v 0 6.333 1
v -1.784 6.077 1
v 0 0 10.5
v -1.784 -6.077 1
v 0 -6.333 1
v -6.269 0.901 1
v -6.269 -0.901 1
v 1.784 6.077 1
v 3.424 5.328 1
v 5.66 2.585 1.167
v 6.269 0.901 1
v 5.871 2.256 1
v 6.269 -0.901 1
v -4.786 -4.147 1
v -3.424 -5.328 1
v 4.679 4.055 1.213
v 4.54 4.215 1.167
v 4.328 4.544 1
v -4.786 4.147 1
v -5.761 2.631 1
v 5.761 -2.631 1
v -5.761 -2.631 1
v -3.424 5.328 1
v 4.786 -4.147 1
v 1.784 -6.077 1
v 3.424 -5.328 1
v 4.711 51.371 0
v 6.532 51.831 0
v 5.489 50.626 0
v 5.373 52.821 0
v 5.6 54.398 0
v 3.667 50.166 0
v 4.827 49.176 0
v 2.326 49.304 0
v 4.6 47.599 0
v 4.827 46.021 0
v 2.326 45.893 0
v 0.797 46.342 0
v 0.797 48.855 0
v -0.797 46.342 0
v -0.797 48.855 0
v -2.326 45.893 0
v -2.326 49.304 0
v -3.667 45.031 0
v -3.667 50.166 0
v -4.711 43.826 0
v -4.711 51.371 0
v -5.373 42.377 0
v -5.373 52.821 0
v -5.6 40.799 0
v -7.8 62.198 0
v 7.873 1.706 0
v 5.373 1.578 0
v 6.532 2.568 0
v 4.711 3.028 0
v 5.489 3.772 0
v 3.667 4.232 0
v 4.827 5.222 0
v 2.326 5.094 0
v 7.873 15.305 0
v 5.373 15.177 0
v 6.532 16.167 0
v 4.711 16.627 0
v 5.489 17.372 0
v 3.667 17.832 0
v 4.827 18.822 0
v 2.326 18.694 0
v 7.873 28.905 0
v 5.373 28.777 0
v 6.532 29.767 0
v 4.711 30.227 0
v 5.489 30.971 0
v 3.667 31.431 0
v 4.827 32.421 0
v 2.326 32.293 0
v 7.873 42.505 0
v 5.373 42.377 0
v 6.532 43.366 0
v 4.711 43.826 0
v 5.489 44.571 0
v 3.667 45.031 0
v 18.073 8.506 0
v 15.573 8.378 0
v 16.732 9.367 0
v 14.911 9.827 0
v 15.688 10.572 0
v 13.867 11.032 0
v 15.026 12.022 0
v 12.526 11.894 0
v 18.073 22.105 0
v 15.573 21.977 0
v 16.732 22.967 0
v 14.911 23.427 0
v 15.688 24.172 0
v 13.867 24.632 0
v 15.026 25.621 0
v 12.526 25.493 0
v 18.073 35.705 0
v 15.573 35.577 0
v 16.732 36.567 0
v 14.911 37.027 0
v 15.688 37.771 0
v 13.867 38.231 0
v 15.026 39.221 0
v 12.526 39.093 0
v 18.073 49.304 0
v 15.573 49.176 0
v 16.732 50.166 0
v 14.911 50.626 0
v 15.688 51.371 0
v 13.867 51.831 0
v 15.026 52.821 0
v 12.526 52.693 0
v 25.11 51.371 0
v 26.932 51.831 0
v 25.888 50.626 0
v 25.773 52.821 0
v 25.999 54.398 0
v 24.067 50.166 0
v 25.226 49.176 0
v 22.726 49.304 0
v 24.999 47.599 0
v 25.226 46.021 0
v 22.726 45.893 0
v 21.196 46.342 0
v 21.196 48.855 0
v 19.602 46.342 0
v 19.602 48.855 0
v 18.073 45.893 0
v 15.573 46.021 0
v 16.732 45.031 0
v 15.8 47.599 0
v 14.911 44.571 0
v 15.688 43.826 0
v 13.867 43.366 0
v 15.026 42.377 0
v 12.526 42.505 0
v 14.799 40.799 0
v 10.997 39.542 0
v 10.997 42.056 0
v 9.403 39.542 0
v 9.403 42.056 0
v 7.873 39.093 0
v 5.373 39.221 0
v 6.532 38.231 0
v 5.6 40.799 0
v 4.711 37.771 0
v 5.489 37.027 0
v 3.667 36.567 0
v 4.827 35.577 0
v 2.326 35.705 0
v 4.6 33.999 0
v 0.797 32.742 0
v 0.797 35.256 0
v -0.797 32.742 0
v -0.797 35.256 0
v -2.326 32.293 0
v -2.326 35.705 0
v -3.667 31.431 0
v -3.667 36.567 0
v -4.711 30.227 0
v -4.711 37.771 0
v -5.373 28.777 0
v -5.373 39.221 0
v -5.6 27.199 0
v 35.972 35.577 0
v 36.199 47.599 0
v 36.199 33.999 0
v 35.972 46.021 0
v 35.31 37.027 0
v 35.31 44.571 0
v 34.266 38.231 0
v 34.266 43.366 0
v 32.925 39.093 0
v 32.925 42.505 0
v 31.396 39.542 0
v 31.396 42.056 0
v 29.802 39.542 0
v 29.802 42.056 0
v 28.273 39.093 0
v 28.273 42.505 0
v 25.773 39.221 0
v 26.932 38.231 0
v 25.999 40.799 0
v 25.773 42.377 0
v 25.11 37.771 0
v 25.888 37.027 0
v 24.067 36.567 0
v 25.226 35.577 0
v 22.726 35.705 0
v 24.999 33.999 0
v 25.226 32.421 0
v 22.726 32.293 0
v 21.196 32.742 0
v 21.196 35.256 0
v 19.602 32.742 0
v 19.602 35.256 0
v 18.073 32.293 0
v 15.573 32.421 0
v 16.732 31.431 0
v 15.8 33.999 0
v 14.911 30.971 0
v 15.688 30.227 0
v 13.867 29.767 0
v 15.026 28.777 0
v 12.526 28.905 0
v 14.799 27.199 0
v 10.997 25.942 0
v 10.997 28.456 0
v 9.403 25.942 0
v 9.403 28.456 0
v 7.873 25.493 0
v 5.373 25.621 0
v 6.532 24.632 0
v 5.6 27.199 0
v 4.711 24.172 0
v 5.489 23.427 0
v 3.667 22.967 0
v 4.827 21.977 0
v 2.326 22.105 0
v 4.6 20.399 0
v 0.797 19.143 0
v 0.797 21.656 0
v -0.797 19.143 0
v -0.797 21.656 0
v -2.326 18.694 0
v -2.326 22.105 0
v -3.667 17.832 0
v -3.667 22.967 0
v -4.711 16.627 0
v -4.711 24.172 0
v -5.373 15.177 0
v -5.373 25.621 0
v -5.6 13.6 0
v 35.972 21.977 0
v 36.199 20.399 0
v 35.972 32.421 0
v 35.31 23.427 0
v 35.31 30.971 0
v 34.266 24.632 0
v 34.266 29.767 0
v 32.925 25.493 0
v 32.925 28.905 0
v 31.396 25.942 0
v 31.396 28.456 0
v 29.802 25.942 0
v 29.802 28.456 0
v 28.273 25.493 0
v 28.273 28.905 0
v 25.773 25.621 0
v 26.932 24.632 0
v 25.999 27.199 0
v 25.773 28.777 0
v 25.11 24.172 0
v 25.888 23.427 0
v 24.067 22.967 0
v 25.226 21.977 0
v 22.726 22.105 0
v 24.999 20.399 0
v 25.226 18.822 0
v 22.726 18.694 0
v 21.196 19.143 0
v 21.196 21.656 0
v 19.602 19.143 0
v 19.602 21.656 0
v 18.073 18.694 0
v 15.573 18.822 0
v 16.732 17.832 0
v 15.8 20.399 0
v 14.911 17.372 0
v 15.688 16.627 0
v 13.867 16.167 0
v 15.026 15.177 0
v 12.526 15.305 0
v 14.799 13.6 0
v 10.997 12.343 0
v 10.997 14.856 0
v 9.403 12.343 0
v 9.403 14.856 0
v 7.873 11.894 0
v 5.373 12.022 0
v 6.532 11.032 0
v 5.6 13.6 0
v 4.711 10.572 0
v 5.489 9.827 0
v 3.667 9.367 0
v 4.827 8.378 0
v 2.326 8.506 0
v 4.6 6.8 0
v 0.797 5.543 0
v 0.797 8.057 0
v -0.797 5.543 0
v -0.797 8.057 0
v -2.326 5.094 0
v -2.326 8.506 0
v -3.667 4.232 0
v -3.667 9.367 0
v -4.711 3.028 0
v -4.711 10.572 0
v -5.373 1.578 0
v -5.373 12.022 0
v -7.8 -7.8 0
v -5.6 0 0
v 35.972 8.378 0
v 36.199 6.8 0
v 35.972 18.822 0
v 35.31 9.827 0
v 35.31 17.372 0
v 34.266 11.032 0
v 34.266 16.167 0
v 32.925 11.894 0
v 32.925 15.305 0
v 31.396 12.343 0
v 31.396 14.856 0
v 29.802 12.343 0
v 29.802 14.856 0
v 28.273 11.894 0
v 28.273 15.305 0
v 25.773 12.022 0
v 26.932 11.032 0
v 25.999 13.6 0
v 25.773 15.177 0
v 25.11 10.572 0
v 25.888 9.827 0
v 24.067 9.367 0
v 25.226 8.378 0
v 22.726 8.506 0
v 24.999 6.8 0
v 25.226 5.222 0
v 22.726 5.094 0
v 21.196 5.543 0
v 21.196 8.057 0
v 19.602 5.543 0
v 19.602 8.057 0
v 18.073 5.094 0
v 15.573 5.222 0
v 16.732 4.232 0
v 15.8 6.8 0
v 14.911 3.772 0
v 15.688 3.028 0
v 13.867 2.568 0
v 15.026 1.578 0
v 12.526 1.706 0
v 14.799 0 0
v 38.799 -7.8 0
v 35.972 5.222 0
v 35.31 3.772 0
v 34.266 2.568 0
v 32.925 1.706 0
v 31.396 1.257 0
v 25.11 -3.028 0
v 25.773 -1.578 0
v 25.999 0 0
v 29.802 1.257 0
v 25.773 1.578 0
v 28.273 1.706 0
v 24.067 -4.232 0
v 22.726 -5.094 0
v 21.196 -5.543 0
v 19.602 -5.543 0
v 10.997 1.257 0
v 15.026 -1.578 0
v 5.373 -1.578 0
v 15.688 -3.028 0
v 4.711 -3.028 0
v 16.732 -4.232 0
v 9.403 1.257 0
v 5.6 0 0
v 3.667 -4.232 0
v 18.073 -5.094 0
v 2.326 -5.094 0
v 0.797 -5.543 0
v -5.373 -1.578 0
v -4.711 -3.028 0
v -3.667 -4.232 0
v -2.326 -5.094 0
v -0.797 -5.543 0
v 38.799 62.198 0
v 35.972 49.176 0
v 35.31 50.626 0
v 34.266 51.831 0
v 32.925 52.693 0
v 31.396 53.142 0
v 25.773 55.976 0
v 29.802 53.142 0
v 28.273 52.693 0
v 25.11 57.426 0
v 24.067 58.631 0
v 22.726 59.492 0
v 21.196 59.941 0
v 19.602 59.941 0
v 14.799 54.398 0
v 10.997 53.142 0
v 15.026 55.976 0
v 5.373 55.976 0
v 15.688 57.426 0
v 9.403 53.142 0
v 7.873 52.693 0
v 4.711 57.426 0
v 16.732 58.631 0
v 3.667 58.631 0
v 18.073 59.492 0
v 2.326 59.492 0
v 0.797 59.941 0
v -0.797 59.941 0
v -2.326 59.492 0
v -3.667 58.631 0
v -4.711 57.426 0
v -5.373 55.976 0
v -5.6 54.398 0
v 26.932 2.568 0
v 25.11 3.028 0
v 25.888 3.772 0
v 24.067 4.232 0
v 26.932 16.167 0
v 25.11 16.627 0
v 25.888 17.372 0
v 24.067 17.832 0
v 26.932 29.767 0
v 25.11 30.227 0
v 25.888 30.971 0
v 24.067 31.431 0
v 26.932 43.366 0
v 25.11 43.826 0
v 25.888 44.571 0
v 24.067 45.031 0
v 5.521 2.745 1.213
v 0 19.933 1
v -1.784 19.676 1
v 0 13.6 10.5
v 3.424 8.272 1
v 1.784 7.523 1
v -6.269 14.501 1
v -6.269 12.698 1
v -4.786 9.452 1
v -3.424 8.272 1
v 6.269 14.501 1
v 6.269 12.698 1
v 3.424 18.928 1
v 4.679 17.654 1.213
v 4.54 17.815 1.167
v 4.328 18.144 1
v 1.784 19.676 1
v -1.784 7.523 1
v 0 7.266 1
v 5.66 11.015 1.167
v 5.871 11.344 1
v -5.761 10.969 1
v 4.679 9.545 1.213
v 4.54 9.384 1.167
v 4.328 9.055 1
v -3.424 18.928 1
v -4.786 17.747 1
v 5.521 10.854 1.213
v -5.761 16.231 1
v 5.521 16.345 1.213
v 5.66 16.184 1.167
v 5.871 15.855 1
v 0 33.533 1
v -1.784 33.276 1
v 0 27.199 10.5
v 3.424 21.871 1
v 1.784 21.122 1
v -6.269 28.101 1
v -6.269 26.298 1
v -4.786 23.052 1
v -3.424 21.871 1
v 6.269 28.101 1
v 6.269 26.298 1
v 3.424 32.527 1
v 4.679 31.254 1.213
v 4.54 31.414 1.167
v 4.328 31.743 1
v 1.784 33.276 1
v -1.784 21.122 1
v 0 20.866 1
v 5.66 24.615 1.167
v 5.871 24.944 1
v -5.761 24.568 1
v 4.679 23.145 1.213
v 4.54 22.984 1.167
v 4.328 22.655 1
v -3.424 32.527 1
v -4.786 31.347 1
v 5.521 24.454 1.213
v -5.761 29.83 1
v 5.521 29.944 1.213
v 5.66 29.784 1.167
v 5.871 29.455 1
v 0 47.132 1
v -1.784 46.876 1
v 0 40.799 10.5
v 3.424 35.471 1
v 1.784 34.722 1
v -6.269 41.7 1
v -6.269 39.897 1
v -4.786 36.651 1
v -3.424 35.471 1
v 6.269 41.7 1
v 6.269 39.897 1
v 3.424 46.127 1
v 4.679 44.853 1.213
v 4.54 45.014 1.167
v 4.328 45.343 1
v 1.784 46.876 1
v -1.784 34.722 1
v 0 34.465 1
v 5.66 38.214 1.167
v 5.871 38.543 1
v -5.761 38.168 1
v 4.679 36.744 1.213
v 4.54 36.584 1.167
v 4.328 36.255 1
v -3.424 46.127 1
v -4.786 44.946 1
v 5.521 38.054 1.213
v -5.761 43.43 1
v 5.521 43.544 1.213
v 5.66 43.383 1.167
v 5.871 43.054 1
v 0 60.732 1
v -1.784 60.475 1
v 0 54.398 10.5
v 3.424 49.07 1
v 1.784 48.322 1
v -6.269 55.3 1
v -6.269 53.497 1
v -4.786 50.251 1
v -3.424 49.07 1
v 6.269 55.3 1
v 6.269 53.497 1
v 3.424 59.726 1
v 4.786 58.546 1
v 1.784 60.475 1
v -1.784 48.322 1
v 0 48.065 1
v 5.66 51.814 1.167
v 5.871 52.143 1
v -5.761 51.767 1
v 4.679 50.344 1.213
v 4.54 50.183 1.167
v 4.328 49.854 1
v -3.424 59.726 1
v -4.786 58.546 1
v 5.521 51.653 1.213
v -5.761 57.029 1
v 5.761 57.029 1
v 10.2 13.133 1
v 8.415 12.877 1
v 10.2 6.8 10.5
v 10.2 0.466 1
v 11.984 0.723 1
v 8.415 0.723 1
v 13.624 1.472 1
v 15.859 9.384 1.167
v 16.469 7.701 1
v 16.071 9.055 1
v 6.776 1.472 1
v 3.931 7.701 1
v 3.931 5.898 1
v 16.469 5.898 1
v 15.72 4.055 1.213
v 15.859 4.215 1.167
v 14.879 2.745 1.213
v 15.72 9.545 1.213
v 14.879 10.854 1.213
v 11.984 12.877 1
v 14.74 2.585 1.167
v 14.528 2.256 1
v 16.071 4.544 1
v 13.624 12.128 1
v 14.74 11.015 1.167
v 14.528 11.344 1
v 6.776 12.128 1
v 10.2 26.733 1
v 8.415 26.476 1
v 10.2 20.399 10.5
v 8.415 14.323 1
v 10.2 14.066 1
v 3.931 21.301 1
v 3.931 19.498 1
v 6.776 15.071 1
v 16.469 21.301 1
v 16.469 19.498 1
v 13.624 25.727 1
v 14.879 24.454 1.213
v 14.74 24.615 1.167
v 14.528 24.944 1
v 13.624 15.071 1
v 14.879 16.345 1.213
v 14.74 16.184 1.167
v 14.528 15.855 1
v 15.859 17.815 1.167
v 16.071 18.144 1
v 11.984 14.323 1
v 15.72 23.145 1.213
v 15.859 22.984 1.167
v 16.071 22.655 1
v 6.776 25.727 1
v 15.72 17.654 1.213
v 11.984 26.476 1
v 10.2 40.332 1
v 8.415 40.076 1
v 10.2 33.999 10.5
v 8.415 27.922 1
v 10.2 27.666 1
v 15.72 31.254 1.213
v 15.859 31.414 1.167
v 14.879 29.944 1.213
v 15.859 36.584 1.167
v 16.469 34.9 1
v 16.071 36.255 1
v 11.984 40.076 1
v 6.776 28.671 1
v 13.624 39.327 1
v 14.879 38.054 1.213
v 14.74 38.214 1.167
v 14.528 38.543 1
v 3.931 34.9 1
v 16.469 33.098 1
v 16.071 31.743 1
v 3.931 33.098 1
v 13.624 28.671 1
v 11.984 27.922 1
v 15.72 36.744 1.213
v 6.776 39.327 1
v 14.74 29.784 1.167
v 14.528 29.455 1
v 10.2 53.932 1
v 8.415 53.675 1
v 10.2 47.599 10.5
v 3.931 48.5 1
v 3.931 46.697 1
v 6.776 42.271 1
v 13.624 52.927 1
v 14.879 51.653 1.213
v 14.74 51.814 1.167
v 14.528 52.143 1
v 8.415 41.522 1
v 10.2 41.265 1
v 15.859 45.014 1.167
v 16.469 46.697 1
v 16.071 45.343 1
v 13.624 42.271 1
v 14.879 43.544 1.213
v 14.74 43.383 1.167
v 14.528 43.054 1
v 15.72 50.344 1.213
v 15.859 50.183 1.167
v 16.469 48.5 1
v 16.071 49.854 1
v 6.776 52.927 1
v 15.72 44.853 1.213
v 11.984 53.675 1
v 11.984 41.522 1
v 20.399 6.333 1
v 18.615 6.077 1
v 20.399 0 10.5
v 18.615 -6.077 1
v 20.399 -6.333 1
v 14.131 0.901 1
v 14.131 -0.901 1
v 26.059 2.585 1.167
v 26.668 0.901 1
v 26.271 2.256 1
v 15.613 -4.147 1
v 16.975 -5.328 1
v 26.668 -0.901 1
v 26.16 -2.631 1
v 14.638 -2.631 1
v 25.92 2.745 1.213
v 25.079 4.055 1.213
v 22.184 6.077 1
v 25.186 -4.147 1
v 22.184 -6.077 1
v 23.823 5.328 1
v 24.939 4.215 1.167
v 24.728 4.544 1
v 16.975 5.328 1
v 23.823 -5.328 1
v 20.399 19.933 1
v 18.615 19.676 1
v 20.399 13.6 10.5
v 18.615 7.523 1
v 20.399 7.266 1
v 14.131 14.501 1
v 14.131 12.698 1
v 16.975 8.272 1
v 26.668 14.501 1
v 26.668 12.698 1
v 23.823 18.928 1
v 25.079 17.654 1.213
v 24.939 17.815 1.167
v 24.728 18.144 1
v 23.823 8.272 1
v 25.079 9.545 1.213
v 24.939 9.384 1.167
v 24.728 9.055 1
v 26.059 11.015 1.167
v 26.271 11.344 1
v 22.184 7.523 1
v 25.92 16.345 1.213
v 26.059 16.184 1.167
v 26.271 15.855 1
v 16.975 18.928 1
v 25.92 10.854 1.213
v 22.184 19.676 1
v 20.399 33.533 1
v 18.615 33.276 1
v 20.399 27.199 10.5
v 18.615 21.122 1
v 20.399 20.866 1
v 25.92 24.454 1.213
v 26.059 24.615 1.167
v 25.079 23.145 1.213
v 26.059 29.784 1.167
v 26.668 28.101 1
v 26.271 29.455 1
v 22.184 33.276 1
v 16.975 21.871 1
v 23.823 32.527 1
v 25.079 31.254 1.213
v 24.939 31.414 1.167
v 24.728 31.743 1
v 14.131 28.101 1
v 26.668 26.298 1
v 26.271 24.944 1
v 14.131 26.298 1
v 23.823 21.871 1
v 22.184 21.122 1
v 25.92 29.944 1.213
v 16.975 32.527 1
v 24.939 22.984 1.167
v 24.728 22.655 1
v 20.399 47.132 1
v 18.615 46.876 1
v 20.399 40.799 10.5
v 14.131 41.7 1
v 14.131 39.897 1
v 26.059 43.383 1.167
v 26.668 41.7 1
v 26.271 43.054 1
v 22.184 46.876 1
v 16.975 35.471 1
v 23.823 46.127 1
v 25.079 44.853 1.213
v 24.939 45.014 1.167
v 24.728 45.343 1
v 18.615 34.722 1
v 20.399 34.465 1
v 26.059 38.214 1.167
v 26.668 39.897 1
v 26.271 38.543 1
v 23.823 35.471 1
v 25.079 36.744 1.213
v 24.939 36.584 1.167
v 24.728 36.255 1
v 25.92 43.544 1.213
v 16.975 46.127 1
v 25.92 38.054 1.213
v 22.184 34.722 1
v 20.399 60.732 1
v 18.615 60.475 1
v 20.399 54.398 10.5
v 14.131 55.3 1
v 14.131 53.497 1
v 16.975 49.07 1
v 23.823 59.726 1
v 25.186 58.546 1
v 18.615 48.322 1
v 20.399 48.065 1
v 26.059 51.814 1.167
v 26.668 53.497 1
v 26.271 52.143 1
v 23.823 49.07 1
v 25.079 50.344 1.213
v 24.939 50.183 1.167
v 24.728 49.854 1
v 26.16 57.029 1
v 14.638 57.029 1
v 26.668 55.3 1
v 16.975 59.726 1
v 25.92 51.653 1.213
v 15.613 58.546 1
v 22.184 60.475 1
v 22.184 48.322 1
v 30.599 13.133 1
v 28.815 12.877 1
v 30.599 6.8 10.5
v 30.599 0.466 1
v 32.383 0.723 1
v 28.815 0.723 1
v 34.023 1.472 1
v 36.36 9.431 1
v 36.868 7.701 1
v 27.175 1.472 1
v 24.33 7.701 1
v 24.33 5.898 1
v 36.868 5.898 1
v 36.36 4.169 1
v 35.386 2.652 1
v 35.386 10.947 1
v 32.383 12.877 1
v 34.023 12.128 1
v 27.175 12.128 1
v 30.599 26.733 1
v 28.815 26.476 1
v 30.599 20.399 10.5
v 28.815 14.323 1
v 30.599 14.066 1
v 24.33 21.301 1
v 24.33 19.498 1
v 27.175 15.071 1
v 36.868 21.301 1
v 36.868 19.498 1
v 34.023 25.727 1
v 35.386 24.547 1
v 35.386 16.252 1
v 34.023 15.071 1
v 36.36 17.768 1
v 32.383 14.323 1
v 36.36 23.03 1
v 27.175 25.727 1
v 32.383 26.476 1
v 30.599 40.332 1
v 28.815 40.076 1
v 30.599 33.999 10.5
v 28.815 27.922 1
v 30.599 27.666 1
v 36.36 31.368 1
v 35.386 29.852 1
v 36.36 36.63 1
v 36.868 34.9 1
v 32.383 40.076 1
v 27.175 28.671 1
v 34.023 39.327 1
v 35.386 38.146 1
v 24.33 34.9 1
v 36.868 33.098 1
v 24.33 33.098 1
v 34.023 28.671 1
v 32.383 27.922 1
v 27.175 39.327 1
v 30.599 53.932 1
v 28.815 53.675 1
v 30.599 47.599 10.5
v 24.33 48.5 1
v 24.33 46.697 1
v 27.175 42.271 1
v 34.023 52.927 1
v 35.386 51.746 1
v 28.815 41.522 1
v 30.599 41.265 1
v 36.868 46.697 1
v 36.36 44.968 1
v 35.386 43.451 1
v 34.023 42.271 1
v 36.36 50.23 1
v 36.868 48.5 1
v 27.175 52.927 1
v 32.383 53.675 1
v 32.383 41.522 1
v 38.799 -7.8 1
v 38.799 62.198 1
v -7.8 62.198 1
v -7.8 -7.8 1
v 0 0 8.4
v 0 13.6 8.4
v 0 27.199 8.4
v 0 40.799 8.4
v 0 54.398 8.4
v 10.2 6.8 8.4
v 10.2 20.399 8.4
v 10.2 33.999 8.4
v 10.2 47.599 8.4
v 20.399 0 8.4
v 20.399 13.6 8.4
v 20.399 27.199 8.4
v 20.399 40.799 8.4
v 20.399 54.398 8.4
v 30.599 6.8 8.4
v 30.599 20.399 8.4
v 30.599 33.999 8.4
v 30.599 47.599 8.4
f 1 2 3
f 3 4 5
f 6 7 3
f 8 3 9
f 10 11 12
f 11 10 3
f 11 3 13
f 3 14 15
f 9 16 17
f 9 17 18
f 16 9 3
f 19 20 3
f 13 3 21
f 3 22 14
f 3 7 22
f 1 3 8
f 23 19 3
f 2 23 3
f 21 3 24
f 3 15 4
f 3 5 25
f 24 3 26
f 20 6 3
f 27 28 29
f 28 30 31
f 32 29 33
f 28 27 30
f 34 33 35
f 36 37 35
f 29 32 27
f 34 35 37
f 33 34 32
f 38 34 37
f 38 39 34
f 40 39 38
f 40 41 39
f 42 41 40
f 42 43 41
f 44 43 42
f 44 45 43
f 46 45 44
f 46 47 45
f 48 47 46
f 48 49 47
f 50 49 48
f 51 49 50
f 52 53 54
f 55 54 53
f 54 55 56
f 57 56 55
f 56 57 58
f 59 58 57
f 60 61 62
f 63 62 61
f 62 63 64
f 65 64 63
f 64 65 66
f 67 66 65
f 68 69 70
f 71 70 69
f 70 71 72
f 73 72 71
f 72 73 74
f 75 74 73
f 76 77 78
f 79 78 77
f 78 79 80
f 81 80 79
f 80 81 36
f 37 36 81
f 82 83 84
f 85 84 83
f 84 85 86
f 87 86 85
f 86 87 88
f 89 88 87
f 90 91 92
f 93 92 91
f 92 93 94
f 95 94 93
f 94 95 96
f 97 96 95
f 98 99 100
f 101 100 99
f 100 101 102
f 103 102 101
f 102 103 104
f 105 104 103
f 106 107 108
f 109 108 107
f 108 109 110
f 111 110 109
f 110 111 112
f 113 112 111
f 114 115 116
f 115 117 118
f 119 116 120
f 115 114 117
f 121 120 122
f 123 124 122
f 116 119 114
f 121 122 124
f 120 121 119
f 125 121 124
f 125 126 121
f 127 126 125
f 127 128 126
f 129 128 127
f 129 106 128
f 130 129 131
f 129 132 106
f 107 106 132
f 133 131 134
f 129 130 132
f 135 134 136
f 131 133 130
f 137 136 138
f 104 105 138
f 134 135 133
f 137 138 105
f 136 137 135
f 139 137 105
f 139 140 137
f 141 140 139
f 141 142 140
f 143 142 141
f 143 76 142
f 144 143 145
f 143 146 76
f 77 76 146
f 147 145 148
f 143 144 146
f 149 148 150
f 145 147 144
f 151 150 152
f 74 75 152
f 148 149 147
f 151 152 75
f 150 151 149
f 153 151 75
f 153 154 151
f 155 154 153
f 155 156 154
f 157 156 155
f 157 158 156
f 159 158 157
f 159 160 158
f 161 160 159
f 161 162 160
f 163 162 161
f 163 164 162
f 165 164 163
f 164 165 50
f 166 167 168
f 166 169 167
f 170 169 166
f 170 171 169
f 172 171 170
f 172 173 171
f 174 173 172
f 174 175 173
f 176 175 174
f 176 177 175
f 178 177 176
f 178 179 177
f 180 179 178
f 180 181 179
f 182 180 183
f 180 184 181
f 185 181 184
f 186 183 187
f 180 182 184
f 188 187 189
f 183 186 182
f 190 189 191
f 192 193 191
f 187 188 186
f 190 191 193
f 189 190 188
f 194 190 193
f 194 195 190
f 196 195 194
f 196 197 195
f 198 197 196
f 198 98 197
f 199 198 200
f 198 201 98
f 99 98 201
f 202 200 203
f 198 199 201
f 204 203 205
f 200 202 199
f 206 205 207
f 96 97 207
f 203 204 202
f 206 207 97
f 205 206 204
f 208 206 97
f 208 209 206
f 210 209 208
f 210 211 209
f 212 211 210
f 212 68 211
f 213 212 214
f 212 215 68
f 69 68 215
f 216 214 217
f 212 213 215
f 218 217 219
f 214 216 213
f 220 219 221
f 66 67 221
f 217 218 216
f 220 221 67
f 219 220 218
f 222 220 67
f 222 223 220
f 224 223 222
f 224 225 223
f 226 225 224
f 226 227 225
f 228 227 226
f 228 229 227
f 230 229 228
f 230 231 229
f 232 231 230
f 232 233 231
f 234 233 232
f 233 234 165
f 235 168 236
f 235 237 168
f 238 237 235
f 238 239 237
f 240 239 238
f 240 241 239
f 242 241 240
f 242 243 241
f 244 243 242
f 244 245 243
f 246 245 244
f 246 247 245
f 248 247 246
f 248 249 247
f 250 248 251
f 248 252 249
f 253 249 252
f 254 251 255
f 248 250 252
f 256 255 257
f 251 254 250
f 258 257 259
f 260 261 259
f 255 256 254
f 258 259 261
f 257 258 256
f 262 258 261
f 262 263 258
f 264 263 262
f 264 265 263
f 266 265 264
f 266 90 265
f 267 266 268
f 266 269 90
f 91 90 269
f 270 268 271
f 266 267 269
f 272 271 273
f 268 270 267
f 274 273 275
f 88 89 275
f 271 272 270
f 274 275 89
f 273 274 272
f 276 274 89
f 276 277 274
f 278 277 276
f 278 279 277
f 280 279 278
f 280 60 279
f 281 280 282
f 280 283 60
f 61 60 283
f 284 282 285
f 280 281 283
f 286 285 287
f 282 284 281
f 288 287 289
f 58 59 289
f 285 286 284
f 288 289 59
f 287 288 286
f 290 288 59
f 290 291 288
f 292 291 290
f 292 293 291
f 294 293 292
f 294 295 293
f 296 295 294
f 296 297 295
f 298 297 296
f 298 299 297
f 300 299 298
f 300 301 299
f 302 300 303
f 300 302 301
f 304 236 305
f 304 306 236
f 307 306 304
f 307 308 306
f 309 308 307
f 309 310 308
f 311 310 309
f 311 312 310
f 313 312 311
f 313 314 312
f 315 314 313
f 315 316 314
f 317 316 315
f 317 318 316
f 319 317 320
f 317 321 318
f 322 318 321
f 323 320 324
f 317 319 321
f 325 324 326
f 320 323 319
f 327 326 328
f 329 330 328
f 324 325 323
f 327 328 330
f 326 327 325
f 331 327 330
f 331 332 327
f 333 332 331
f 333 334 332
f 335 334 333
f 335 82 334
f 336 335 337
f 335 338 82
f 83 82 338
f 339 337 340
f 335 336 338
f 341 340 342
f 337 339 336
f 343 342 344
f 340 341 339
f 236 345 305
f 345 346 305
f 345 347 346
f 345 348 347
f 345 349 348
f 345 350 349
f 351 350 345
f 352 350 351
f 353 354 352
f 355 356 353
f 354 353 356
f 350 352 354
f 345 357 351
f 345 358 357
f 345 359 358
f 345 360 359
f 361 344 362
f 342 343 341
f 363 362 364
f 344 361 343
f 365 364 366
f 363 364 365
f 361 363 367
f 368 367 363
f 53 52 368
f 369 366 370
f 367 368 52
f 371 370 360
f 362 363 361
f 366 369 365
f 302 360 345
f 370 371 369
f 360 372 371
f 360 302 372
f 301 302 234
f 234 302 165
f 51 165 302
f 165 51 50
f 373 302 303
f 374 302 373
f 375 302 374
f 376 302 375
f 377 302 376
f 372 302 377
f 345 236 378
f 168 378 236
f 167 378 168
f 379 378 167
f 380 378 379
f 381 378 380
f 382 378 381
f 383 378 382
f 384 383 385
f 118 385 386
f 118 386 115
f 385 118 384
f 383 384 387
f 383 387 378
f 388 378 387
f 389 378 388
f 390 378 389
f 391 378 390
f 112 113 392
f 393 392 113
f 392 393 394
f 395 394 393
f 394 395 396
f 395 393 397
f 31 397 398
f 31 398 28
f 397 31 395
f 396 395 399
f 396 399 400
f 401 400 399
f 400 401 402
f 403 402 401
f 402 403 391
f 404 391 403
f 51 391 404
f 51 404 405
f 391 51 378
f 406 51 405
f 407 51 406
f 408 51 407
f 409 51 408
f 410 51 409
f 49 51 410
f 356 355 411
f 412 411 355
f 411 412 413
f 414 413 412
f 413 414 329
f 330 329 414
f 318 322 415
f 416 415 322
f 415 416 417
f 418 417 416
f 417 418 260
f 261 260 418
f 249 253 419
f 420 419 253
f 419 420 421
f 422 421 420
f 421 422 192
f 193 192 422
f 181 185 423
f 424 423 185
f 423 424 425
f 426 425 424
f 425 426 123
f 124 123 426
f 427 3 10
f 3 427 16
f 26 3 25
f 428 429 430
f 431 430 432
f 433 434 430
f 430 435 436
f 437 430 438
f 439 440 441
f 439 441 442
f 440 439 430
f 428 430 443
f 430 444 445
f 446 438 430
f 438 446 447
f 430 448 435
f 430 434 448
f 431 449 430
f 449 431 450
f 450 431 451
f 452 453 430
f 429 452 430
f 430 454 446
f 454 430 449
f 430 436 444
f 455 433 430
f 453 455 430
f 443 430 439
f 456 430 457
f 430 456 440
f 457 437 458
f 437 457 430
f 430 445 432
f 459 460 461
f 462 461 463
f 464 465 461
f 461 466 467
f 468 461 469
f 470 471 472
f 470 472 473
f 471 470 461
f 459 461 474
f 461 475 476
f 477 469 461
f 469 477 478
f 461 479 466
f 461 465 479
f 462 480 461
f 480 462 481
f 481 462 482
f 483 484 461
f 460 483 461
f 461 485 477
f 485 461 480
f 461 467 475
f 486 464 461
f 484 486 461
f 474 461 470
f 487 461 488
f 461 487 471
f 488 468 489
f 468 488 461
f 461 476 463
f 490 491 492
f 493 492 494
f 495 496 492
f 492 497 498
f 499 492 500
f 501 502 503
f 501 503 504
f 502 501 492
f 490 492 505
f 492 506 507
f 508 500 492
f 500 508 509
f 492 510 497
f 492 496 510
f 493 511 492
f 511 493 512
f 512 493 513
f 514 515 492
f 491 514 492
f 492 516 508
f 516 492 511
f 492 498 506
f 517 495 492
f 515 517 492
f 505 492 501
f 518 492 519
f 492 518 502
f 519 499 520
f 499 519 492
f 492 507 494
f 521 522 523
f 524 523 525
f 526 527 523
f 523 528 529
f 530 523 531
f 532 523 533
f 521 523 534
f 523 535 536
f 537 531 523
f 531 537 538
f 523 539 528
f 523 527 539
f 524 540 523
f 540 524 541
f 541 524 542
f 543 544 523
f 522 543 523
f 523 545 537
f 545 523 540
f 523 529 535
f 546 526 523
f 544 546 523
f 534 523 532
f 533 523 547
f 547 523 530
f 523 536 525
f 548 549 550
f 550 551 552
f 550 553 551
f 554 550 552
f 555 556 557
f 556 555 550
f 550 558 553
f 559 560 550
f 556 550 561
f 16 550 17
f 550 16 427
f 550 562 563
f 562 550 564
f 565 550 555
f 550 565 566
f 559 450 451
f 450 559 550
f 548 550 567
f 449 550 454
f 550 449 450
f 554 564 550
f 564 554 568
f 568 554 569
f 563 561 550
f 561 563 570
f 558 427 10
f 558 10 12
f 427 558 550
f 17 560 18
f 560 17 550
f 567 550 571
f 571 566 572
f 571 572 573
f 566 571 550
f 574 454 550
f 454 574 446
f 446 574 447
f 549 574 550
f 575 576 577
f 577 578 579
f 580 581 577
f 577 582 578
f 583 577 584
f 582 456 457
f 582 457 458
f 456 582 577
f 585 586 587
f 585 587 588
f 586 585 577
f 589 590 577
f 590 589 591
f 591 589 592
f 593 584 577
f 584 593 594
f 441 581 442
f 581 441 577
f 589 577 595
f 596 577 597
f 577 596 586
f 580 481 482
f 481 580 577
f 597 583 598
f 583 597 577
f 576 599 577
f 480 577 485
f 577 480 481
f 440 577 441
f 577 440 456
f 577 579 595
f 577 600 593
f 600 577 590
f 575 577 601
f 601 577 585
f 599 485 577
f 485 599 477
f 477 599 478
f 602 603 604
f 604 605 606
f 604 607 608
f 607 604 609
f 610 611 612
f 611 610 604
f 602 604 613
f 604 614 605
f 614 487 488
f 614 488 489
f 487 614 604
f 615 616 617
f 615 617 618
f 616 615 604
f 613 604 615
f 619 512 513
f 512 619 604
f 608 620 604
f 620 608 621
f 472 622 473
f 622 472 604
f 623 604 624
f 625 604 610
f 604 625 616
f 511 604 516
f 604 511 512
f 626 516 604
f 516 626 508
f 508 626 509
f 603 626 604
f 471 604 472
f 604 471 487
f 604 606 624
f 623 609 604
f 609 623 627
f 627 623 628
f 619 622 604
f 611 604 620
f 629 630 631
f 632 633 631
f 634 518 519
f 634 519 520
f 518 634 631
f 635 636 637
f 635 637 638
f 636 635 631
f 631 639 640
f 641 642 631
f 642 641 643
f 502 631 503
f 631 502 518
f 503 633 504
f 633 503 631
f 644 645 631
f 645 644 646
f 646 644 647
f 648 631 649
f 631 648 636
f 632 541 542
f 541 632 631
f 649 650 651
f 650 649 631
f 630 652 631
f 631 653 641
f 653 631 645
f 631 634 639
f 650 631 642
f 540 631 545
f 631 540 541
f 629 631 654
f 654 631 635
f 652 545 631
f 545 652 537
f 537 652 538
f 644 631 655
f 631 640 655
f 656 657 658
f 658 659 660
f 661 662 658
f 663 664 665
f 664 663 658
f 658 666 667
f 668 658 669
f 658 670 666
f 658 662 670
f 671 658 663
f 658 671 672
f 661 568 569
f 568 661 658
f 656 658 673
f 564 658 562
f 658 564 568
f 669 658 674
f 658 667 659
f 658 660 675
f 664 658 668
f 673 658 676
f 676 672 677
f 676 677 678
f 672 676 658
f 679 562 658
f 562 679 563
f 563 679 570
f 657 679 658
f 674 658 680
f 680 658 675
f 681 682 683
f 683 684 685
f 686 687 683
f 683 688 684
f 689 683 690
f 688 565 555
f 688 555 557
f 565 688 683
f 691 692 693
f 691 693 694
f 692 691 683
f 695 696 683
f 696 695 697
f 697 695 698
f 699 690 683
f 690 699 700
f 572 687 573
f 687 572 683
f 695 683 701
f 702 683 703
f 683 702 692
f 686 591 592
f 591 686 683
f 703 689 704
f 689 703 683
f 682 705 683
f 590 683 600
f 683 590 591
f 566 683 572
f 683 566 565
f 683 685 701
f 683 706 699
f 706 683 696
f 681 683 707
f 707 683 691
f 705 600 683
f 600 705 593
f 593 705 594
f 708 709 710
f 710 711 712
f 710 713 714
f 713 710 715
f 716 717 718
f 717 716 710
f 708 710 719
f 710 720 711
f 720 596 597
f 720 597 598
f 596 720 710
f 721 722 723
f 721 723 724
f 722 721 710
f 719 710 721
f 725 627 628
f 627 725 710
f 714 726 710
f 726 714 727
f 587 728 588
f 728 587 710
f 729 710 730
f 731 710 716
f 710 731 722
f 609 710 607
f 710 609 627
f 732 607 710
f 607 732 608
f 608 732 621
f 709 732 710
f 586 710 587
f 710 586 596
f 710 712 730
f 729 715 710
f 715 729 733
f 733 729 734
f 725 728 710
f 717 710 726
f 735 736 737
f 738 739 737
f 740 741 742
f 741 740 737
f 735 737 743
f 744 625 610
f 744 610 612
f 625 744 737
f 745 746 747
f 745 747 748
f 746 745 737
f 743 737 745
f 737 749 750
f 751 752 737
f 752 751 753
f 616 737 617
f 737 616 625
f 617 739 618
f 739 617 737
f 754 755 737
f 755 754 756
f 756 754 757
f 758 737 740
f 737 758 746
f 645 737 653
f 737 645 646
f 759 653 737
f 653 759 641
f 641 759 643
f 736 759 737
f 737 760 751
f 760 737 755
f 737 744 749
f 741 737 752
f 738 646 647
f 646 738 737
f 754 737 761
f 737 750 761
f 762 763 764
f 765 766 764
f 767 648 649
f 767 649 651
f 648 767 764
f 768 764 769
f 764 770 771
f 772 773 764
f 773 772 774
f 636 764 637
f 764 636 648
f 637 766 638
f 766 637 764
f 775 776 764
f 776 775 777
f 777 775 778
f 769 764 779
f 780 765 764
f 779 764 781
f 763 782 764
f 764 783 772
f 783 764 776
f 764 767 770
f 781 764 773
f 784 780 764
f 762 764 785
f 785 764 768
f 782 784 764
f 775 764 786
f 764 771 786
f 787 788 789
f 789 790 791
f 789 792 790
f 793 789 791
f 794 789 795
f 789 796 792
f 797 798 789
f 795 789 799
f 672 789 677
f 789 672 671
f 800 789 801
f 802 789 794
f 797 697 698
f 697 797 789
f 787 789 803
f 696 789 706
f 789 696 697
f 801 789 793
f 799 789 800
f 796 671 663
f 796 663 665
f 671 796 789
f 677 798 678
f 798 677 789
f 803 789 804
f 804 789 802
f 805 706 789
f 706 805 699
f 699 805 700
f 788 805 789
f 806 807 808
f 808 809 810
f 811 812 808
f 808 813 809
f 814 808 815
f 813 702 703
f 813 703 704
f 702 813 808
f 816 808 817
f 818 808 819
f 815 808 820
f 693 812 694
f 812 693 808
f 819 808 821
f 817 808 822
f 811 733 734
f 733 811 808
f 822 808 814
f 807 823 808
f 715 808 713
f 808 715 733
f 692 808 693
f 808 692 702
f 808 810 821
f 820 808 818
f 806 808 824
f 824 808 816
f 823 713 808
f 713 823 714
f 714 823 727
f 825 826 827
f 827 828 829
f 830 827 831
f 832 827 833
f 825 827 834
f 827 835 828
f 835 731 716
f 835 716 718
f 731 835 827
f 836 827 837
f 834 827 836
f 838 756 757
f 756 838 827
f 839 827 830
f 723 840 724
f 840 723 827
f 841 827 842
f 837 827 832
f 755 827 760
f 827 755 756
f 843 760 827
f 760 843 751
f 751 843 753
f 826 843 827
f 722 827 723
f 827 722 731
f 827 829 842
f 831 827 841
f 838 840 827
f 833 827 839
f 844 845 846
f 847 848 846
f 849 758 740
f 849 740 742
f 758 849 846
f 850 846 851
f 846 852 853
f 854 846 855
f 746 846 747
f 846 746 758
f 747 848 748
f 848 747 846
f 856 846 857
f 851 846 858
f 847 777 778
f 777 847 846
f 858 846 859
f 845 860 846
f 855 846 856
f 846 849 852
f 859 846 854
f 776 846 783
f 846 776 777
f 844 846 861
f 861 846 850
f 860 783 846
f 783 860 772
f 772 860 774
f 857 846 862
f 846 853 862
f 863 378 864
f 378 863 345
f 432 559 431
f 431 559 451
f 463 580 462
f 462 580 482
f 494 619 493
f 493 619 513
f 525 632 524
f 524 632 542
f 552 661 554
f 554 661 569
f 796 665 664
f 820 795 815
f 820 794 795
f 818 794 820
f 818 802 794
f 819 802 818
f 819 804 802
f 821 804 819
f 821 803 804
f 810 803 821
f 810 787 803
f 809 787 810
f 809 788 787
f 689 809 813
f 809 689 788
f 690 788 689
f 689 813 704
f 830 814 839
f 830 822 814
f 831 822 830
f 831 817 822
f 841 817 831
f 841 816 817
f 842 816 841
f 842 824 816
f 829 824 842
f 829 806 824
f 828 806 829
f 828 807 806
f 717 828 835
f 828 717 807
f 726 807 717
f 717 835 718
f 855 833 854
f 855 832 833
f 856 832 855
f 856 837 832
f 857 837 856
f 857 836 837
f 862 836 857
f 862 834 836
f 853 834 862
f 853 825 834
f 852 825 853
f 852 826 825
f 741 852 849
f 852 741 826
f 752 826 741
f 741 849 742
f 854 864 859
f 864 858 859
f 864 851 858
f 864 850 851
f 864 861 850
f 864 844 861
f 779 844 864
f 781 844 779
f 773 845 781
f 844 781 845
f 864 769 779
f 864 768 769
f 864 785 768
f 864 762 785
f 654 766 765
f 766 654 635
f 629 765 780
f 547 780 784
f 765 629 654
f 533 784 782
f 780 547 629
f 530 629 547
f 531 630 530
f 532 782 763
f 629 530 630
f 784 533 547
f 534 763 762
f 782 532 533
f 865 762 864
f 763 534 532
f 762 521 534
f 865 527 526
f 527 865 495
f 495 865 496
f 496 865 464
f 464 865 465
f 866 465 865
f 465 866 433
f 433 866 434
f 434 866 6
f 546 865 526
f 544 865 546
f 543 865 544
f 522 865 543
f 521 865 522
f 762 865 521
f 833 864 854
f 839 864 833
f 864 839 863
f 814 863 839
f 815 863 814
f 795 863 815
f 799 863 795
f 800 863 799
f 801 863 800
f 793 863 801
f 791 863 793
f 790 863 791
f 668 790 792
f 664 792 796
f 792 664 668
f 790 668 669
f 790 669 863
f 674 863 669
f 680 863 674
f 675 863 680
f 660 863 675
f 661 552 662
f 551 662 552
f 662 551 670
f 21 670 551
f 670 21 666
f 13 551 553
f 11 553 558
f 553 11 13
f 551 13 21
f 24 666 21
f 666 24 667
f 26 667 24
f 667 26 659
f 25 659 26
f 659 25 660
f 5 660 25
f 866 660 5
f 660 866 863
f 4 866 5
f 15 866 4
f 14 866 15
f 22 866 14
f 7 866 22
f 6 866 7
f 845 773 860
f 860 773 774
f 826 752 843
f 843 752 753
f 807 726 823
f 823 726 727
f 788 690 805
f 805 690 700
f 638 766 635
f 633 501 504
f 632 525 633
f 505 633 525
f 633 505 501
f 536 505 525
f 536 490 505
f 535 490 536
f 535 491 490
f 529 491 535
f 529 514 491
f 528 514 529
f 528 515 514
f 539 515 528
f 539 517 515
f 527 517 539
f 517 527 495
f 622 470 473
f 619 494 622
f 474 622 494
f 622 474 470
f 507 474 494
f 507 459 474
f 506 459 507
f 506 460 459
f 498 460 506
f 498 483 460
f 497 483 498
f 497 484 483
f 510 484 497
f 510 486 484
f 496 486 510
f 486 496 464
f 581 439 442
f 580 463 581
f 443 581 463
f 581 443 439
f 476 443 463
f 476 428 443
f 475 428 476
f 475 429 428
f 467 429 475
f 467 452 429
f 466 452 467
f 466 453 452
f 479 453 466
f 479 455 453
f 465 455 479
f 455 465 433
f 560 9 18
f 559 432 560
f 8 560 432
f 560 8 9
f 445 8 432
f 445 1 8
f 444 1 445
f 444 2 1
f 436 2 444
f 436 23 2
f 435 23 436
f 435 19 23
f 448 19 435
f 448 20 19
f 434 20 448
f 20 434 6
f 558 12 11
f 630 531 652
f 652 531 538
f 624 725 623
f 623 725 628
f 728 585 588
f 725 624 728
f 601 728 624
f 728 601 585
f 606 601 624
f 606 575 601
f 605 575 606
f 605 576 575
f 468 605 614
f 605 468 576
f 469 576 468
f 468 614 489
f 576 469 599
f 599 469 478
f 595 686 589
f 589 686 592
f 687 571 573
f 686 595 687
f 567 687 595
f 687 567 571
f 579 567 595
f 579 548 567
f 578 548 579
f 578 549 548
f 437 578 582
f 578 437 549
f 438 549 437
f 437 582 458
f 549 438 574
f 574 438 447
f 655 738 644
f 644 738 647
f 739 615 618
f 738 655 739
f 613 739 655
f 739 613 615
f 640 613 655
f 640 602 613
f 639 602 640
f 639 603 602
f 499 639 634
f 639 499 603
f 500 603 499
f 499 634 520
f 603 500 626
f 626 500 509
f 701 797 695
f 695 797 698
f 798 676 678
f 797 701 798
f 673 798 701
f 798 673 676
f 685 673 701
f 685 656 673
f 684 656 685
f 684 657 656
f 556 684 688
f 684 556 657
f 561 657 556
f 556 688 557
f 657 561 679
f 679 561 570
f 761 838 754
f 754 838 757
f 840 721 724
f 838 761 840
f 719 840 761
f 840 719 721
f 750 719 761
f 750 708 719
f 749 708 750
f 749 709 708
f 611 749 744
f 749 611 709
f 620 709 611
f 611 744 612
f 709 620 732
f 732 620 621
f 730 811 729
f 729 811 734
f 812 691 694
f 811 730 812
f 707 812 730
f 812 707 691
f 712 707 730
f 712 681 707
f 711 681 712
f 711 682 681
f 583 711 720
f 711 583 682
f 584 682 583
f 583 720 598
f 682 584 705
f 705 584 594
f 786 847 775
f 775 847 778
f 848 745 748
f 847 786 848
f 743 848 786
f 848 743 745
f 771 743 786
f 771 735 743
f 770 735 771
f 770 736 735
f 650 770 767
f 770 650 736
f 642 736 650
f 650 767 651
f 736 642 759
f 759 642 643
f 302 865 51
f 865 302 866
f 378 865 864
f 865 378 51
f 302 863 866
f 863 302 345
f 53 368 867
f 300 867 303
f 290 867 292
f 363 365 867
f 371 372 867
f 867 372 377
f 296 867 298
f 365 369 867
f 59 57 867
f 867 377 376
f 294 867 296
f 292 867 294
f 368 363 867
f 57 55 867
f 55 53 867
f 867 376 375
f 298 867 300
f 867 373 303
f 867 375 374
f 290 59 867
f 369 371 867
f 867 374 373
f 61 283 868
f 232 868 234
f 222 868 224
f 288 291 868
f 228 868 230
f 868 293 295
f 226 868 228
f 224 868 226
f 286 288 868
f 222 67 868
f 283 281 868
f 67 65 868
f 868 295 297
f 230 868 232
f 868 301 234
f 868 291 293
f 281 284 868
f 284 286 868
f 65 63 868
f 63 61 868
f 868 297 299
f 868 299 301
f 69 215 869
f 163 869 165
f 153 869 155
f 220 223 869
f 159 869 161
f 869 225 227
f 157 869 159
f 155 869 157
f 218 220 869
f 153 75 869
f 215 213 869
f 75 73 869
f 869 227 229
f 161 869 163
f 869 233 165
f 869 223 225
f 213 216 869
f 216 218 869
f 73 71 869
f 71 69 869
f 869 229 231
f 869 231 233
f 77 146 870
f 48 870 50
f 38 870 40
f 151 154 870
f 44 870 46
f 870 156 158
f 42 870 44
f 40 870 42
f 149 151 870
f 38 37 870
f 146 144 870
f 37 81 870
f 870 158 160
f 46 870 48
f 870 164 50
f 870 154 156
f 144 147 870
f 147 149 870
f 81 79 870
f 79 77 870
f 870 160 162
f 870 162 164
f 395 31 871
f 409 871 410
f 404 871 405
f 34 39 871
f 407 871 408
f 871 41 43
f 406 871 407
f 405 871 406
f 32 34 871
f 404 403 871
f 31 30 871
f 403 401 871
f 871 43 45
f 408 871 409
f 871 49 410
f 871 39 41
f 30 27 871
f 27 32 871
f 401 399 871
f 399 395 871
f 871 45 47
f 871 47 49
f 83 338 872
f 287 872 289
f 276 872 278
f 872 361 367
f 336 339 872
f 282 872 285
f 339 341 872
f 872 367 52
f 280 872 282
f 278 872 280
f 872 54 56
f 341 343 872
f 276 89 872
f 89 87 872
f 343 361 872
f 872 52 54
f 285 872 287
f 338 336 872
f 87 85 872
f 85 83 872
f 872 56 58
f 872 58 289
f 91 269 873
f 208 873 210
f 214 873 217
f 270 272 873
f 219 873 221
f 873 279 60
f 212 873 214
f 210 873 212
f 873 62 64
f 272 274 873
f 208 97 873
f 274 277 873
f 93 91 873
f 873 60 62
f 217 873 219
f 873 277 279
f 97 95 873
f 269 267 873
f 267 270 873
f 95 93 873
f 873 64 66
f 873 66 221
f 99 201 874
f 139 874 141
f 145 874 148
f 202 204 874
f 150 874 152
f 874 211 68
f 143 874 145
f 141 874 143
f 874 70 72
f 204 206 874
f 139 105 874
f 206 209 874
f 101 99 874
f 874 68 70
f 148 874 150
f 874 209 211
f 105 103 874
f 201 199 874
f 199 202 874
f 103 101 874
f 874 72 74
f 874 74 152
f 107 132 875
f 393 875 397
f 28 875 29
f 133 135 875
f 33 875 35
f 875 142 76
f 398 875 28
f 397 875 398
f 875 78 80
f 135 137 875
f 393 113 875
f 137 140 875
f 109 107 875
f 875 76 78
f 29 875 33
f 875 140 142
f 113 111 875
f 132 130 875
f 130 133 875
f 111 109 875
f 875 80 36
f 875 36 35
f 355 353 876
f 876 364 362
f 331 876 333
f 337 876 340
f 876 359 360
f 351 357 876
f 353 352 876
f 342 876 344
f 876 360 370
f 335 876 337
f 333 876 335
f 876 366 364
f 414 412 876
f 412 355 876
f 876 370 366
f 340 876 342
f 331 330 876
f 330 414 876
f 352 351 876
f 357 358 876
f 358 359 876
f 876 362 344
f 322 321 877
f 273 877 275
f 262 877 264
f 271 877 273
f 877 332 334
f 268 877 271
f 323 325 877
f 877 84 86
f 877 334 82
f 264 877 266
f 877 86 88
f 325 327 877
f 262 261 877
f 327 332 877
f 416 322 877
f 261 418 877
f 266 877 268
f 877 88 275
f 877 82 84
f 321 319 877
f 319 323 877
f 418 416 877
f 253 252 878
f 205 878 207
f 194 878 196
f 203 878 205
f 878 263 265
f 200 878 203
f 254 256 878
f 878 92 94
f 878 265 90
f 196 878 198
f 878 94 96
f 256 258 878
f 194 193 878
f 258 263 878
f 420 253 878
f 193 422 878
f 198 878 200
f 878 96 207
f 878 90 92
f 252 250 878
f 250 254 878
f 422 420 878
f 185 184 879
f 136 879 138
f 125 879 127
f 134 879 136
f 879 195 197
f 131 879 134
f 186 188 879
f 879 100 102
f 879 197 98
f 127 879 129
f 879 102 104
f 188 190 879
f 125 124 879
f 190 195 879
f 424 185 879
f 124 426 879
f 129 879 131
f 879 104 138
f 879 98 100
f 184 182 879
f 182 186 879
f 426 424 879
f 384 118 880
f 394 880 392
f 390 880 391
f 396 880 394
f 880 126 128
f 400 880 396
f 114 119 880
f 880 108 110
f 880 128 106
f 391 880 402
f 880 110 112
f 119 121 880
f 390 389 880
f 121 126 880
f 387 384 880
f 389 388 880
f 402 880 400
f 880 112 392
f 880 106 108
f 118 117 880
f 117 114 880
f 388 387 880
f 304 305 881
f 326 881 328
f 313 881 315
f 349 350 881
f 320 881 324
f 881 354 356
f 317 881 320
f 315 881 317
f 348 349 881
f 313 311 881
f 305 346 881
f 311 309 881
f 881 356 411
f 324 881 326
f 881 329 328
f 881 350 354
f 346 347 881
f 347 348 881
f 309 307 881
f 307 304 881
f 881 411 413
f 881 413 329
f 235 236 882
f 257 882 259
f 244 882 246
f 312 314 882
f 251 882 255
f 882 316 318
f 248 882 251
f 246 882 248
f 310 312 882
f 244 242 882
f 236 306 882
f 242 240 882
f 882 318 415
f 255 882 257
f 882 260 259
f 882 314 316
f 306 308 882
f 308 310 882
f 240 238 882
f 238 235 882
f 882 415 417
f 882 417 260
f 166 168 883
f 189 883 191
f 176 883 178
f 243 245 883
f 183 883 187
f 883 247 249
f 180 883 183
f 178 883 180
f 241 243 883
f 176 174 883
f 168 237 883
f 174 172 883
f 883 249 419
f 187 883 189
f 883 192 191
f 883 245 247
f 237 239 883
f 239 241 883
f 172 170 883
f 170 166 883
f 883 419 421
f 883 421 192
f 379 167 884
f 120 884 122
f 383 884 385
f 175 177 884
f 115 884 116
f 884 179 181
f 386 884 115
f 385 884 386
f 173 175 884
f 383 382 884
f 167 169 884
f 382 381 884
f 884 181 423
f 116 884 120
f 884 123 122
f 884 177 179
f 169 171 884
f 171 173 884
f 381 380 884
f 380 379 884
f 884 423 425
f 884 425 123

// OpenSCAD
////////////////
// Variables that you can change for customizations to fit your needs.
////////////////

// The row and column values can be modified to fit you needs
rows = 4; // If the number of rows is > 2 then the columns get offset and
          // the rows get compressed. This is done to provide a more solid
          // base for objects to sit on.

columns = 5;

void = false; // Whether or not to cut out voids in the cones. No matter what 
              // value is chosen the cones are hollowed out.



cone_short = true; // Should the cones be short or tall. Taller cones allow for
                   // easier lifting of objects.

////////////////
// other Variables
////////////////
// Change these at your own risk
x = 0;
y = 0;

cone_base = 14; // You can change the width of the cone by adjusting this 
                // value. I would suggest not changing it but it is up to you.
                // I have not fully tested this script with different bases.
                // What testing I have done seems to indicate it works.

cone_height = (cone_short) ? cone_base * .75 : cone_base * 1.5;
cone_offset = cone_base *.9714;
cone_inset_z = -cone_height * .2;

////////////////
// Main
////////////////
difference() {
    union() {
        for (row = [0: rows - 1]) {
            render_columns = (rows > 2 && ((row - 1) / 2) == round((row - 1) / 2)) ? columns - 1 : columns;
            for (column = [0: render_columns - 1]) {
                Cone(GetConeX(row, rows, 0, cone_offset), GetConeY(row, rows, column, cone_offset), cone_base, cone_height, cone_offset);
            }
        }
        x_render_offset = (rows > 2) ? -cone_offset / 4 : -cone_offset / 4;
        translate([-cone_offset / 2 - cone_base/14, -cone_offset / 2 - cone_base/14, 0])
        cube([GetBaseWidth(rows, cone_offset), columns * (cone_offset) + cone_base/7, 1]);
    }

    for (row = [0: rows - 1]) {
        render_columns = (rows > 2 && ((row - 1) / 2) == round((row - 1) / 2)) ? columns - 1 : columns;
        for (column = [0: render_columns - 1]) {
            Void(GetConeX(row, rows, 0, cone_offset), GetConeY(row, rows, column, cone_offset), cone_base, cone_height, cone_offset, void);
        }
    }

}

////////////////
// Functions
////////////////
function GetBaseWidth(rs, co) =
rs <= 2 ?
    rs * (co + 1) :
    (rs) * (co) - (co / 4 * rs) + co / 2 - 1;

function GetConeX(r, rs, c, co) =
(r > 0 && rs > 2) ?
r * co + -co / 4 * r:
    r * co;

function GetConeY(r, rs, c, co) =
((rs > 2 && (r / 2 == round(r / 2))) || (rs <= 2)) ?
c * co:
    c * co + co / 2;


////////////////
// Modules
////////////////
module Cone(x, y, cb, ch, co) {
    difference() {
        translate([x, y, 0])
        union() {
            rotate([0, 0, 90]) cylinder(h = ch, r1 = cb / 2, r2 = 0, center = false);
        }

    }
}

module Void(x, y, cb, ch, co, void = true) {

    translate([x, y, -ch * .2])
    cylinder(h = ch, r1 = cb / 2, r2 = 0, center = false);
    if (void) {
        TriangleVoid(x, y, cb, ch);
        rotate([0, 0, 90]) TriangleVoid(y, -x, cb, ch);
    }
}

module TriangleVoid(x, y, cb, ch) {

    y1 = -cb / 2 + y;
    y2 = cb / 2 + y;
    z1 = ch * .15;
    x1 = -cb / 2 + cb / 3 + x;
    x2 = cb / 2 - cb / 3 + x;
    x3 = 0 + x;
    z2 = ch * .7;

    polyhedron(
        points = [
            [x1, y1, z1],
            [x2, y1, z1],
            [x3, y1, z2],
            [x1, y2, z1],
            [x2, y2, z1],
            [x3, y2, z2]
        ],
        faces = [
            [0, 1, 2],
            [0, 2, 5, 3],
            [0, 3, 4, 1],
            [1, 4, 5, 2],
            [3, 5, 4]
        ]
    );
}
